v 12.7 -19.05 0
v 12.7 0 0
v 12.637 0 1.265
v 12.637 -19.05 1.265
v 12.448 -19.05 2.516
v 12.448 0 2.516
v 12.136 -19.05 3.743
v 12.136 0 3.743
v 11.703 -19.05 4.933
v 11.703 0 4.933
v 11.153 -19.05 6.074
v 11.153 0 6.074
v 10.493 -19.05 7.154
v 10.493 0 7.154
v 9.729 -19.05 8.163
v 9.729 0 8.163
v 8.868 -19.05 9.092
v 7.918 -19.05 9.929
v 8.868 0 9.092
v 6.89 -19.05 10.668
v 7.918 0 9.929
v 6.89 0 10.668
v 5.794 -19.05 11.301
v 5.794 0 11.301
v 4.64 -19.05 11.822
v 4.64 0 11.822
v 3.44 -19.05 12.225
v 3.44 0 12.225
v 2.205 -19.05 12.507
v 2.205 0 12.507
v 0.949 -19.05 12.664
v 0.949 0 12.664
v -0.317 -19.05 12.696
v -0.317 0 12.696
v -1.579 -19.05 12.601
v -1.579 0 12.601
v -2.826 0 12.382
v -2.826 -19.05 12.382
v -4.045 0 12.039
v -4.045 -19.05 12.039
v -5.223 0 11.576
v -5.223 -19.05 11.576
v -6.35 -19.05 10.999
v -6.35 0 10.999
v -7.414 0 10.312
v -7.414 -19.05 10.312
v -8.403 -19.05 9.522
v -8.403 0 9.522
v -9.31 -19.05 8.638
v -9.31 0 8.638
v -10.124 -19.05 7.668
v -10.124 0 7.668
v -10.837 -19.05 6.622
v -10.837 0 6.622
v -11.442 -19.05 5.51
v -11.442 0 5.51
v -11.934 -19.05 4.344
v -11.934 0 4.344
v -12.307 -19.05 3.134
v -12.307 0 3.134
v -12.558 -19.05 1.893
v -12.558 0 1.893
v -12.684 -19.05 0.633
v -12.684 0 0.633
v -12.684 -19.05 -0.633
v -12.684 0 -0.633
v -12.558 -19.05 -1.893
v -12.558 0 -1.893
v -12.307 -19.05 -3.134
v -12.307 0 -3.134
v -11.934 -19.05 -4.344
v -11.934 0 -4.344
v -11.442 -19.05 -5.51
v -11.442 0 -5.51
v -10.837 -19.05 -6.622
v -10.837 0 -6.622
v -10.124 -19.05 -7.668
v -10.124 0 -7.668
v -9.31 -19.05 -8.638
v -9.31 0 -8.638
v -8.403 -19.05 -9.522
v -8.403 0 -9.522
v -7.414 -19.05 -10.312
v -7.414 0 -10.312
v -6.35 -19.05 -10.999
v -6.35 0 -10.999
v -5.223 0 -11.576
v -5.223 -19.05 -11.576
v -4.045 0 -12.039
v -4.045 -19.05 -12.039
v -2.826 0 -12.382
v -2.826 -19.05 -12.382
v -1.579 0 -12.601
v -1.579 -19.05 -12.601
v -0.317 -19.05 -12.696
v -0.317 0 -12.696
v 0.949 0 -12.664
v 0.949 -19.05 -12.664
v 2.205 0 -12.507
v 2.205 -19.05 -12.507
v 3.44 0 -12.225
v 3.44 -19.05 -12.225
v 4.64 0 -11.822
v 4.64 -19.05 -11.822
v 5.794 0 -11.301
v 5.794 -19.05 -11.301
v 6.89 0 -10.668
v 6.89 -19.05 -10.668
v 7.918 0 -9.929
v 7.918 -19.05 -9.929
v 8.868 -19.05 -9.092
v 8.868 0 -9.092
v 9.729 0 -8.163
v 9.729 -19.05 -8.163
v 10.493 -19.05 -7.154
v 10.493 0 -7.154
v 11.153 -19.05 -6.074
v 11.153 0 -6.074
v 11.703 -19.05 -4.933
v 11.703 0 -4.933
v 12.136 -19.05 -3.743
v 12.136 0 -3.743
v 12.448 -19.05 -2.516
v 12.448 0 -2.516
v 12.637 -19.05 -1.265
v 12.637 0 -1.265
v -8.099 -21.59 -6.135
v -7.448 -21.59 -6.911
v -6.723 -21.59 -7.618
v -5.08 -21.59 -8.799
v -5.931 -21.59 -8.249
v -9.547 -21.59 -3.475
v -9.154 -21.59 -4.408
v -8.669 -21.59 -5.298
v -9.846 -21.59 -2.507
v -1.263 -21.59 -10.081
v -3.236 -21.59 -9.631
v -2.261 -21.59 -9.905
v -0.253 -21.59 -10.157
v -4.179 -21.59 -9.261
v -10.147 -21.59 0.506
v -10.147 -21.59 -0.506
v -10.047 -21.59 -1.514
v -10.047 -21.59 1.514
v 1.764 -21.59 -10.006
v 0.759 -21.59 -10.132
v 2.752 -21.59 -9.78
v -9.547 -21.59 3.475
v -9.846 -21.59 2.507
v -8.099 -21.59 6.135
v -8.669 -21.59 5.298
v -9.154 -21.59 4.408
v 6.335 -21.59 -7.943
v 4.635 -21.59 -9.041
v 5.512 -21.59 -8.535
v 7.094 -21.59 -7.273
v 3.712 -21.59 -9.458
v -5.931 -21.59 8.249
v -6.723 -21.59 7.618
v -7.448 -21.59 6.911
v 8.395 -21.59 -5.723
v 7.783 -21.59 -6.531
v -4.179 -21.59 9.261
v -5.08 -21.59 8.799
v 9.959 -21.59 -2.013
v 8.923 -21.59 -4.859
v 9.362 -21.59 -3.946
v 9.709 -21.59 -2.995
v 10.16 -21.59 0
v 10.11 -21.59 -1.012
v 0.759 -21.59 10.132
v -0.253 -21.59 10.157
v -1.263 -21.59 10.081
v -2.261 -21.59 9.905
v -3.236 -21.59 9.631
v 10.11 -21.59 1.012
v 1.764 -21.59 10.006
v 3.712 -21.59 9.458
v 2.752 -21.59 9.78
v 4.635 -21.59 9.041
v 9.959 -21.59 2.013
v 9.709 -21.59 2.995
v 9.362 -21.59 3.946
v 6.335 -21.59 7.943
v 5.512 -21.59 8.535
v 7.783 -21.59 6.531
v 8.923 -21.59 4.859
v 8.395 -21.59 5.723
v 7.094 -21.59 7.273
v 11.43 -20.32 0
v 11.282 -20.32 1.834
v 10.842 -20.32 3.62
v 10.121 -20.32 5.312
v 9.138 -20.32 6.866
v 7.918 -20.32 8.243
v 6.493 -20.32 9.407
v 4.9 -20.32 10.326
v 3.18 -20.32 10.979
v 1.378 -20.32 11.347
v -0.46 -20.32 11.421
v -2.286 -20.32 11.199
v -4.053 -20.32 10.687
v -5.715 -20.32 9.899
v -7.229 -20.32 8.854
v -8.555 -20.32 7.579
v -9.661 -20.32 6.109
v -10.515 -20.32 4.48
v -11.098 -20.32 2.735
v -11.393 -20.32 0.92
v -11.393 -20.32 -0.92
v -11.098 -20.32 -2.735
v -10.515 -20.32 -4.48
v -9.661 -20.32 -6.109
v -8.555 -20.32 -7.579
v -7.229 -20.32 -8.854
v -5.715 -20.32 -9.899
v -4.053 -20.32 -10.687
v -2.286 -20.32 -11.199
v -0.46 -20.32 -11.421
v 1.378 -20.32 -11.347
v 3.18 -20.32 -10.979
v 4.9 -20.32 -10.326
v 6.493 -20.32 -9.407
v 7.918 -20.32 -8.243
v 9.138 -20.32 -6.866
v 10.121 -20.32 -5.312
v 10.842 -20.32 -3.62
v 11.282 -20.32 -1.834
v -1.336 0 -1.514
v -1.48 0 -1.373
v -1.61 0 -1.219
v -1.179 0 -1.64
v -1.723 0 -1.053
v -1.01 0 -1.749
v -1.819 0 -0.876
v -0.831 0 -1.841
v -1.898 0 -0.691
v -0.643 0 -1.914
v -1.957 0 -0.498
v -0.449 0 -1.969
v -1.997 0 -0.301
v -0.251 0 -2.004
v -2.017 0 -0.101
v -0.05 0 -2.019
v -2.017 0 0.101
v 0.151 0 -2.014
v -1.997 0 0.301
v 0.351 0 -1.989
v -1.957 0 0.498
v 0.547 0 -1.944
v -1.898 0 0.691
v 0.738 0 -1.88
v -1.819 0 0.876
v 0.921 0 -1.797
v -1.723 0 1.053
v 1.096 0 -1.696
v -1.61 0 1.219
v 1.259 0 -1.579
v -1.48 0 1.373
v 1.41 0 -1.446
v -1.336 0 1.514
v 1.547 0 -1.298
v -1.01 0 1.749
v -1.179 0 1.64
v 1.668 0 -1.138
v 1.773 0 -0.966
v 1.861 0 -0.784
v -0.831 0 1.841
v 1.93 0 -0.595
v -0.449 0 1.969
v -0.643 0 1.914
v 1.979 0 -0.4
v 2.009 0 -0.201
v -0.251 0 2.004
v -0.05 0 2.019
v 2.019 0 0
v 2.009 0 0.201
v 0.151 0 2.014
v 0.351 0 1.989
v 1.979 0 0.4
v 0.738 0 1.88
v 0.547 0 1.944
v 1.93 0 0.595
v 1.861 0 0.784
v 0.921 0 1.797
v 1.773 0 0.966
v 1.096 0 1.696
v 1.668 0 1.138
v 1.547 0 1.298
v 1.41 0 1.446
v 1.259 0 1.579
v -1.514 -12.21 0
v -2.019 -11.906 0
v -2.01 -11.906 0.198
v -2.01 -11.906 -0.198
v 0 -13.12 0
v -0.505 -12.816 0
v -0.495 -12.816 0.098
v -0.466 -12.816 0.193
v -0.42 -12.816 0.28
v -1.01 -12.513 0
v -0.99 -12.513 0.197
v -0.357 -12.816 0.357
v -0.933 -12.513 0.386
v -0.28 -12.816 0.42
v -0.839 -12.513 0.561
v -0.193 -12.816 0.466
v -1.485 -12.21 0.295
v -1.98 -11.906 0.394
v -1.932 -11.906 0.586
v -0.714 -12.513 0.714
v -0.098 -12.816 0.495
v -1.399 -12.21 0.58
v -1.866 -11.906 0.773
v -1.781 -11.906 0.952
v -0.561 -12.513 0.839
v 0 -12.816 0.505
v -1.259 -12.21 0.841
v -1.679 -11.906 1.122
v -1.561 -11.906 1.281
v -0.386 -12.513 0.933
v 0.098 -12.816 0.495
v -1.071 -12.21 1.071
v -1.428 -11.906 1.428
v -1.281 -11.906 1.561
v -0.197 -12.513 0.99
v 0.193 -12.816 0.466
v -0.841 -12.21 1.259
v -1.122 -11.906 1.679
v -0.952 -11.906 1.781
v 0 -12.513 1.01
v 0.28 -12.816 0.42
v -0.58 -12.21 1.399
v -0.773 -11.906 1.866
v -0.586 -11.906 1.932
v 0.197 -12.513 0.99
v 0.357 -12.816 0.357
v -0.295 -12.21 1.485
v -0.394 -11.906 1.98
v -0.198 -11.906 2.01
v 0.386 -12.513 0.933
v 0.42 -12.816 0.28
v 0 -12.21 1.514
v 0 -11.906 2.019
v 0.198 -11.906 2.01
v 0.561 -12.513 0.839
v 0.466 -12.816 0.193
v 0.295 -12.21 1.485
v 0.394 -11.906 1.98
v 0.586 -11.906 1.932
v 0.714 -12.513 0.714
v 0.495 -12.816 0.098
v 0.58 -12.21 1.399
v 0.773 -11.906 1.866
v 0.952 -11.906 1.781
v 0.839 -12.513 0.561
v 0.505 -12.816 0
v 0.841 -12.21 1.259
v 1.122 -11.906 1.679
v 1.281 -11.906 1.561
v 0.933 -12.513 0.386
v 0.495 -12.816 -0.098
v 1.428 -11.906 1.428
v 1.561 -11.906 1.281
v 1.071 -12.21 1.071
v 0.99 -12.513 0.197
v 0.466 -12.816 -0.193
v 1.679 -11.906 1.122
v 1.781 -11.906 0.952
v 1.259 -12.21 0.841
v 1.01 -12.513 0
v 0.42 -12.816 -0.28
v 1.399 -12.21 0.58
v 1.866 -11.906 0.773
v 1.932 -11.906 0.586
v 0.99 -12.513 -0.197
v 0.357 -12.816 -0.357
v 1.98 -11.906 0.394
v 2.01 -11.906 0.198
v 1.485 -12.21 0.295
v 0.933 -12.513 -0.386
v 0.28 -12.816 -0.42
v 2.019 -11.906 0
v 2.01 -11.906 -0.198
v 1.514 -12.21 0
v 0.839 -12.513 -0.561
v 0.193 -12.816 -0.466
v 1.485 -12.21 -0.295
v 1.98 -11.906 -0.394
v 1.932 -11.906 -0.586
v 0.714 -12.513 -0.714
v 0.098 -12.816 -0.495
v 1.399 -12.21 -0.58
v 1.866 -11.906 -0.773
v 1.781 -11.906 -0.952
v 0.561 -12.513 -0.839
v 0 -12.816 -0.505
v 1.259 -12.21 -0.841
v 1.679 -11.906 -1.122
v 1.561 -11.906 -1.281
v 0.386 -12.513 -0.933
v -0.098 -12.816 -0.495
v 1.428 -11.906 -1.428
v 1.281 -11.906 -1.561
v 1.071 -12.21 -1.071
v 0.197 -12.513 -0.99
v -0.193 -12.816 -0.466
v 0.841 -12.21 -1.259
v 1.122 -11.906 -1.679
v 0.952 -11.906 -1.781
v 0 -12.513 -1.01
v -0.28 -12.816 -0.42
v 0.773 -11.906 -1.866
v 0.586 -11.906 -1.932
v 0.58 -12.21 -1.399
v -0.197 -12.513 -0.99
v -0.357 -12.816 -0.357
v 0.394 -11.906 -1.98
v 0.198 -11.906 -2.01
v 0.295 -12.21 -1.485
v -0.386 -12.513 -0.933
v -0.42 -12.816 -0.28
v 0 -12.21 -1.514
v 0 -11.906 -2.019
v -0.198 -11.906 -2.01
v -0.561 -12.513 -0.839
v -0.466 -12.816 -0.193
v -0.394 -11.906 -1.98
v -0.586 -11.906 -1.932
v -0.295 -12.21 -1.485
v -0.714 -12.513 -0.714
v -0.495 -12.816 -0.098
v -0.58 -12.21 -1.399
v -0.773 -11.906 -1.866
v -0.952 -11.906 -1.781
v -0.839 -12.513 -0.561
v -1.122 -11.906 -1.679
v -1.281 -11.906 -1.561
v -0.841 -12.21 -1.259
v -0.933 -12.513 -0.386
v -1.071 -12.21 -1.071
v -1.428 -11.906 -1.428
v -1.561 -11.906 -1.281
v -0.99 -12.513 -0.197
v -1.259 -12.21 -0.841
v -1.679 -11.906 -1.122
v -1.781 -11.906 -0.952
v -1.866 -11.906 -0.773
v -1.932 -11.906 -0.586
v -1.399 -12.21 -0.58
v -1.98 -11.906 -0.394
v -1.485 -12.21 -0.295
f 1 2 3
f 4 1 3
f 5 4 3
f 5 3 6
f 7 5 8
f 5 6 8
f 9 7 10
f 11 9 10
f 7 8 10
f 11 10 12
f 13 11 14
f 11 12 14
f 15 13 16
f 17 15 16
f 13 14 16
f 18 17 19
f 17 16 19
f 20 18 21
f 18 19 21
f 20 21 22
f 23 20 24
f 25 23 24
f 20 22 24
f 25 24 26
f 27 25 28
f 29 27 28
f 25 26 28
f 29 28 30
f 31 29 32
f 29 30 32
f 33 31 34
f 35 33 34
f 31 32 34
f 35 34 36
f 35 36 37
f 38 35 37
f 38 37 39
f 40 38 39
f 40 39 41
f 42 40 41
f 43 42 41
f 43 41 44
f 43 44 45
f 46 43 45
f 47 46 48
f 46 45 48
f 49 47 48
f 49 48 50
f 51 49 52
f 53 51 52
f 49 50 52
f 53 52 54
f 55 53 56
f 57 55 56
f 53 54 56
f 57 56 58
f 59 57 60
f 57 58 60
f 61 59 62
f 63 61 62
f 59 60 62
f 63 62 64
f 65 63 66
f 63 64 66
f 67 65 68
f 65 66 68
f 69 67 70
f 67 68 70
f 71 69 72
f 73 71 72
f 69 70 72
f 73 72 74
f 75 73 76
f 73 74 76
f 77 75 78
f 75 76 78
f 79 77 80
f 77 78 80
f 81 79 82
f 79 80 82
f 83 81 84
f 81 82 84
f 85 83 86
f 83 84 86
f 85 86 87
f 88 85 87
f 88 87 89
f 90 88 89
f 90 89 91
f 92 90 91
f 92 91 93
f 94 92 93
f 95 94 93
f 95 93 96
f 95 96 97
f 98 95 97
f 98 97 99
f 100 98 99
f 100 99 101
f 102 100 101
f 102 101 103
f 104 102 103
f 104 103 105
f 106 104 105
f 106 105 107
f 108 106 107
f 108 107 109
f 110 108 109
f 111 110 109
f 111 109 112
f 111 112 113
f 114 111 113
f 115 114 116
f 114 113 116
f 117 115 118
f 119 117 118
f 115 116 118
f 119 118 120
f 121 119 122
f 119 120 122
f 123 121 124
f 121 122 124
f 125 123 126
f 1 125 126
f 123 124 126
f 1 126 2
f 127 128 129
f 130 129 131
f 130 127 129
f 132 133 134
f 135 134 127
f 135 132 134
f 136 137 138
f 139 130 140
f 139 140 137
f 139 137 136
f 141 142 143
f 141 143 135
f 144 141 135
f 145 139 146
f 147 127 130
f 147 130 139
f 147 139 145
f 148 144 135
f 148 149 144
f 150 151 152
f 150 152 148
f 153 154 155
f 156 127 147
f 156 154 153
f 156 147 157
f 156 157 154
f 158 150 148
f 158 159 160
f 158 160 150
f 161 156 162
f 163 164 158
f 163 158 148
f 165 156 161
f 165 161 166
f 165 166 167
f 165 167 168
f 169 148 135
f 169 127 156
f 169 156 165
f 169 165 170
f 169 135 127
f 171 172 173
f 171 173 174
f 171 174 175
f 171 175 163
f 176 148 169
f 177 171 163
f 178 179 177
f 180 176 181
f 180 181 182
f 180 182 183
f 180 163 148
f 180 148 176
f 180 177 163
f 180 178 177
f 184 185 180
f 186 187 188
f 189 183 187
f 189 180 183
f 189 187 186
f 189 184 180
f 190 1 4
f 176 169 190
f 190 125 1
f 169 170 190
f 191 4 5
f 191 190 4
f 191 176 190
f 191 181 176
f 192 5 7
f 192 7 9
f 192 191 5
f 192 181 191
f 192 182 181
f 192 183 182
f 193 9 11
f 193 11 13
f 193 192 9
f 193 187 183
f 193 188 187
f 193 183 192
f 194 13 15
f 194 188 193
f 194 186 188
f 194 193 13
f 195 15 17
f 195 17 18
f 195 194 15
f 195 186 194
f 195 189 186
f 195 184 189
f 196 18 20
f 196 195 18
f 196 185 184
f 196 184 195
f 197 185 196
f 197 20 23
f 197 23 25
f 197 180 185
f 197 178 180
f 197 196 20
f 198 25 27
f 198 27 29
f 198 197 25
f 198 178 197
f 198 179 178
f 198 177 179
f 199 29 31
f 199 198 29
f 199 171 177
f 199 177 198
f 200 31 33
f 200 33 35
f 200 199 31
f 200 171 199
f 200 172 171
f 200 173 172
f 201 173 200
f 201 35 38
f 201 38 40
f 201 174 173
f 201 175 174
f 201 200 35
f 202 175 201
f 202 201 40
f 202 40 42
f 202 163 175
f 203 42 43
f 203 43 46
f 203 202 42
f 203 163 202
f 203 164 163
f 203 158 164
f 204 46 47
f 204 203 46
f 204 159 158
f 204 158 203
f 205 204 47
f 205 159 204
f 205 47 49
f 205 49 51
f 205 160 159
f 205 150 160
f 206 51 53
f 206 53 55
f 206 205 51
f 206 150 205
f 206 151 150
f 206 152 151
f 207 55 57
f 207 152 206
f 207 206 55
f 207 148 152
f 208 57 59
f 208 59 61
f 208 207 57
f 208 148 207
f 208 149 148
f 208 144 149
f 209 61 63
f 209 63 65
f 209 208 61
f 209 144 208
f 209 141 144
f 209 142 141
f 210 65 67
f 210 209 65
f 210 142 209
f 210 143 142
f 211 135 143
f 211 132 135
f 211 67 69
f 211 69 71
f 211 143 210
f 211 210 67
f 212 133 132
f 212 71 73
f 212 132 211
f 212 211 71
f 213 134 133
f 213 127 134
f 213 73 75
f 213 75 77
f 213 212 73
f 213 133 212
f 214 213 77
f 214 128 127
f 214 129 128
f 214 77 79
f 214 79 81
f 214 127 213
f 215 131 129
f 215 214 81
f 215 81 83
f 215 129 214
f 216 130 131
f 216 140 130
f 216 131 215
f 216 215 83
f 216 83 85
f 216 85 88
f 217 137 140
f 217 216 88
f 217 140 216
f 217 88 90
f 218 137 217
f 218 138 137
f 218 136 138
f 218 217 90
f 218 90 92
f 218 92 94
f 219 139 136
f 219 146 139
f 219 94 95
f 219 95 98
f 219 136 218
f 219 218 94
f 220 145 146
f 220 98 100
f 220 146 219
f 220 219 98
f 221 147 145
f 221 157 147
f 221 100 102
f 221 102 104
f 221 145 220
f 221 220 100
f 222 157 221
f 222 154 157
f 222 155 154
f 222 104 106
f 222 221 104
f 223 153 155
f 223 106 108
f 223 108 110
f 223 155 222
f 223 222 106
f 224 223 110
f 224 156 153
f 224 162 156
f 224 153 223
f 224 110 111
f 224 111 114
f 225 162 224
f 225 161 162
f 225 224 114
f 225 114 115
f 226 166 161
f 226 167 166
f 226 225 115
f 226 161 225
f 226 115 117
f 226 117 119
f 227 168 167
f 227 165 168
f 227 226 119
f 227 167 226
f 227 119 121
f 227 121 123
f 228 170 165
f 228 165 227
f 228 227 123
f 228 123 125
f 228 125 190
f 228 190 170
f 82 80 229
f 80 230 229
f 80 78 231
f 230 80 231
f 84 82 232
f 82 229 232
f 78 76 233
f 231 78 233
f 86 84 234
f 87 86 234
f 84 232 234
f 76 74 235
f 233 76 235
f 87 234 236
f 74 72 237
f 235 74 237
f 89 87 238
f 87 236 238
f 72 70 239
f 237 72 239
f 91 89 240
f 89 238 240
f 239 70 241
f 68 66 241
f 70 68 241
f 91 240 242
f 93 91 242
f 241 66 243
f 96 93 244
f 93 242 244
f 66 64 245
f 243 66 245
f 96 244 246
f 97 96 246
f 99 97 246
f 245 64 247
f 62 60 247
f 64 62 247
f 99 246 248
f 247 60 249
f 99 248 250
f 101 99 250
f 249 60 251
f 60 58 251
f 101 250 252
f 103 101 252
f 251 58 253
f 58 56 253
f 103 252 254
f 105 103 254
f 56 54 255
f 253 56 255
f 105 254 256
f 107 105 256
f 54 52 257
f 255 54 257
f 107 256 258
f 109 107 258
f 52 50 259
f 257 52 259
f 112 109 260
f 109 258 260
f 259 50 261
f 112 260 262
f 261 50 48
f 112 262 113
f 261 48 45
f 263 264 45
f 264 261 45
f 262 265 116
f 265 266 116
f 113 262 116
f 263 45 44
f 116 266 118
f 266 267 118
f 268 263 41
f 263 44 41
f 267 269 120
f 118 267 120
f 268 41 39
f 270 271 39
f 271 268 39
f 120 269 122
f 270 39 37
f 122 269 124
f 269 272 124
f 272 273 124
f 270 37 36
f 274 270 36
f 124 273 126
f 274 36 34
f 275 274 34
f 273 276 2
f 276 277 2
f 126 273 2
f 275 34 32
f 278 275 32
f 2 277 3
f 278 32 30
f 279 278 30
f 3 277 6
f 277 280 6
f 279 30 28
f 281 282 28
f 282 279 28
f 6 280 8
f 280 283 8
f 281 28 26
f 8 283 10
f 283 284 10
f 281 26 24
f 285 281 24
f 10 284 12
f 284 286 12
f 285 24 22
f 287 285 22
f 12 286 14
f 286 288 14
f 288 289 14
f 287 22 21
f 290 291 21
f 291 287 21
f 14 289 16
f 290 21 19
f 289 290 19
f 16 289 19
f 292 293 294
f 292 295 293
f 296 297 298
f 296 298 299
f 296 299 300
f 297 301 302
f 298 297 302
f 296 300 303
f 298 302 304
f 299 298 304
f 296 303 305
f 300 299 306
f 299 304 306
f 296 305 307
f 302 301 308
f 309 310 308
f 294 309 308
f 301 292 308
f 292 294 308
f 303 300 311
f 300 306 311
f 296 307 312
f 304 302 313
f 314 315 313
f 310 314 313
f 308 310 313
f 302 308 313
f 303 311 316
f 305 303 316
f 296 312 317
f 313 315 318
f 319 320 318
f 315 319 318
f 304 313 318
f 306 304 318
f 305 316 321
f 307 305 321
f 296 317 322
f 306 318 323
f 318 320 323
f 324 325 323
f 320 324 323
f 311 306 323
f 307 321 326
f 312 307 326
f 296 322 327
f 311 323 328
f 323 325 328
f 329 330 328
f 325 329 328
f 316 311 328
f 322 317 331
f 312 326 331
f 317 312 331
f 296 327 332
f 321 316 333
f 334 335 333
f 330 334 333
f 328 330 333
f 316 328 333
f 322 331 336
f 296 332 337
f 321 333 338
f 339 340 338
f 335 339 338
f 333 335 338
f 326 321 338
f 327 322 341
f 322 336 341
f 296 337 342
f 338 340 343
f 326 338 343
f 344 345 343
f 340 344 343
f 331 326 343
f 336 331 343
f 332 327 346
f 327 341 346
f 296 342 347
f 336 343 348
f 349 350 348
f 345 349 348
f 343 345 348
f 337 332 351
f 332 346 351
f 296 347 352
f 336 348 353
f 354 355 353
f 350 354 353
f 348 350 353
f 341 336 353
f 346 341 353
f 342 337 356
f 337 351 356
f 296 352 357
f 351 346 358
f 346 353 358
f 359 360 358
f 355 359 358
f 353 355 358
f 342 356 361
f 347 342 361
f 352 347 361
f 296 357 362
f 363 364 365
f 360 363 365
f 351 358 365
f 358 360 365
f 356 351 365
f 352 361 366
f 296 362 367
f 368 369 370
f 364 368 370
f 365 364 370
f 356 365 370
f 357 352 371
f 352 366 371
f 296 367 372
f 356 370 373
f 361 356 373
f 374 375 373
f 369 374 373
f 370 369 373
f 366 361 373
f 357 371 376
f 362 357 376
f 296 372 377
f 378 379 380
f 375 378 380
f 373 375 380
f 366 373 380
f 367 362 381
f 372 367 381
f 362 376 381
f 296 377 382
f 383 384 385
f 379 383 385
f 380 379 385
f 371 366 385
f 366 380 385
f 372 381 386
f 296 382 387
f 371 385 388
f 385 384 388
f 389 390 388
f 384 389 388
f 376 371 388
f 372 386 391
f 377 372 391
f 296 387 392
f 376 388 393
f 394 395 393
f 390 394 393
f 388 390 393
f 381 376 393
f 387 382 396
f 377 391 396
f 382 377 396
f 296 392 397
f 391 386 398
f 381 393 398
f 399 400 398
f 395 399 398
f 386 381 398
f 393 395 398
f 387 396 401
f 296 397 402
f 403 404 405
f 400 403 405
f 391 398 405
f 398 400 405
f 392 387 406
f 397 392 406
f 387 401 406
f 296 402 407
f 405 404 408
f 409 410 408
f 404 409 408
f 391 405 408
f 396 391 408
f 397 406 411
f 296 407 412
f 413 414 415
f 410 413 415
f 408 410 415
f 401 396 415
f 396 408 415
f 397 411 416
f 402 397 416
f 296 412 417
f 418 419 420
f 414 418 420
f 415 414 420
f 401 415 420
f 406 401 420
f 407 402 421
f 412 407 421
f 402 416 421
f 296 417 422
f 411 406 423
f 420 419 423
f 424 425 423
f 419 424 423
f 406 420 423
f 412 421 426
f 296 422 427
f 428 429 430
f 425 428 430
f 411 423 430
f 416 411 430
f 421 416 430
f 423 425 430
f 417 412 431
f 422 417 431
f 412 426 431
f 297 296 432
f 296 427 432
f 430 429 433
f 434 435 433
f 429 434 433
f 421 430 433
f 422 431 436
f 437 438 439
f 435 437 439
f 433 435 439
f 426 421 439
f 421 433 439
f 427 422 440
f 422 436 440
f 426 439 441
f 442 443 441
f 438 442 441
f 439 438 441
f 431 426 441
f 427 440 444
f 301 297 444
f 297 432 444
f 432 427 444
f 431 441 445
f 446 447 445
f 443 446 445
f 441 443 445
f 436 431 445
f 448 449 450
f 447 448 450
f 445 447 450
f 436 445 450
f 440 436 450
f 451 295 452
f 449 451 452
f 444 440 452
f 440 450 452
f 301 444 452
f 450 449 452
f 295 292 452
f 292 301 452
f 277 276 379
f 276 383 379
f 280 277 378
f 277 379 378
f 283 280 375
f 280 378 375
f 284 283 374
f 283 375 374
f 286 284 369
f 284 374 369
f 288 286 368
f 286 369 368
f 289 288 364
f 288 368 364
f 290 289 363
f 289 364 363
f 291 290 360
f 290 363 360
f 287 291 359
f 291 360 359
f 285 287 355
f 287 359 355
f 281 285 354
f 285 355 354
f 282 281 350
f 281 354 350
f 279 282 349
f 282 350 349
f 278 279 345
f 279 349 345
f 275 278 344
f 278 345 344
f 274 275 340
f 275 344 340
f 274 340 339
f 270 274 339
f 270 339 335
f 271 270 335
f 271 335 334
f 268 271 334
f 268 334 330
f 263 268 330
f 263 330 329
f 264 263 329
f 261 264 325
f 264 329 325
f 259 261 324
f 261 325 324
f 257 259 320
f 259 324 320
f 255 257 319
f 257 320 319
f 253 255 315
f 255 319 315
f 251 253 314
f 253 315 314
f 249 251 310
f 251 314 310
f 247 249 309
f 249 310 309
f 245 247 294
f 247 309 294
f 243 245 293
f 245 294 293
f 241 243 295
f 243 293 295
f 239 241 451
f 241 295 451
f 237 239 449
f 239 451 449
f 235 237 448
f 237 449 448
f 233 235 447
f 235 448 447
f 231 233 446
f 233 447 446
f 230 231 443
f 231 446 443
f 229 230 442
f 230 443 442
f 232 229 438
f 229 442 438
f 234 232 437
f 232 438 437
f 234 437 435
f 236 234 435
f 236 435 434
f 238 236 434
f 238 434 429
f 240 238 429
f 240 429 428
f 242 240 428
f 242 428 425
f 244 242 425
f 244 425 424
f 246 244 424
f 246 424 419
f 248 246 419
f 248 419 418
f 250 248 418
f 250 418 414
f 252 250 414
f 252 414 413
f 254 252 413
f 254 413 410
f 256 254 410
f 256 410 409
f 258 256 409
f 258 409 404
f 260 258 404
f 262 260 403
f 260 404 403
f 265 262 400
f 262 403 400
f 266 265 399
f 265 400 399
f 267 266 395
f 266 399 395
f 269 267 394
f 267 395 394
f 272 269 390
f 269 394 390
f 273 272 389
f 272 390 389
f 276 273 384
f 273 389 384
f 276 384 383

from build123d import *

# Parameters (mm, degrees)
F0_R     = 12.7
F1_DEPTH = 21.59
F2_SIZE  = 2.54
F4_D     = 4.0386
F4_DEPTH = 11.90625
F4_TIP   = 1.213317848


with BuildPart() as f1:
    # F0 (on Front) → F1 (new body)
    with BuildSketch(Plane.XZ):
        Circle(F0_R)
    extrude(amount=F1_DEPTH)

    # F2
    f2_edges = [f1.edges().sort_by_distance(p)[0] for p in [
        (-12.7, -21.59, 0),
    ]]
    chamfer(f2_edges, length=F2_SIZE)

    # F4
    with Locations(Plane(origin=(0, 0, 0), x_dir=(-1, 0, 0), z_dir=(0, 1, 0))):
        with Locations((0, 0)):
            Hole(F4_D / 2, depth=F4_DEPTH)
            with Locations((0, 0, -(F4_DEPTH + F4_TIP / 2))):  # 118° drill point
                Cone(0, F4_D / 2, F4_TIP, mode=Mode.SUBTRACT)


solid = f1.part
